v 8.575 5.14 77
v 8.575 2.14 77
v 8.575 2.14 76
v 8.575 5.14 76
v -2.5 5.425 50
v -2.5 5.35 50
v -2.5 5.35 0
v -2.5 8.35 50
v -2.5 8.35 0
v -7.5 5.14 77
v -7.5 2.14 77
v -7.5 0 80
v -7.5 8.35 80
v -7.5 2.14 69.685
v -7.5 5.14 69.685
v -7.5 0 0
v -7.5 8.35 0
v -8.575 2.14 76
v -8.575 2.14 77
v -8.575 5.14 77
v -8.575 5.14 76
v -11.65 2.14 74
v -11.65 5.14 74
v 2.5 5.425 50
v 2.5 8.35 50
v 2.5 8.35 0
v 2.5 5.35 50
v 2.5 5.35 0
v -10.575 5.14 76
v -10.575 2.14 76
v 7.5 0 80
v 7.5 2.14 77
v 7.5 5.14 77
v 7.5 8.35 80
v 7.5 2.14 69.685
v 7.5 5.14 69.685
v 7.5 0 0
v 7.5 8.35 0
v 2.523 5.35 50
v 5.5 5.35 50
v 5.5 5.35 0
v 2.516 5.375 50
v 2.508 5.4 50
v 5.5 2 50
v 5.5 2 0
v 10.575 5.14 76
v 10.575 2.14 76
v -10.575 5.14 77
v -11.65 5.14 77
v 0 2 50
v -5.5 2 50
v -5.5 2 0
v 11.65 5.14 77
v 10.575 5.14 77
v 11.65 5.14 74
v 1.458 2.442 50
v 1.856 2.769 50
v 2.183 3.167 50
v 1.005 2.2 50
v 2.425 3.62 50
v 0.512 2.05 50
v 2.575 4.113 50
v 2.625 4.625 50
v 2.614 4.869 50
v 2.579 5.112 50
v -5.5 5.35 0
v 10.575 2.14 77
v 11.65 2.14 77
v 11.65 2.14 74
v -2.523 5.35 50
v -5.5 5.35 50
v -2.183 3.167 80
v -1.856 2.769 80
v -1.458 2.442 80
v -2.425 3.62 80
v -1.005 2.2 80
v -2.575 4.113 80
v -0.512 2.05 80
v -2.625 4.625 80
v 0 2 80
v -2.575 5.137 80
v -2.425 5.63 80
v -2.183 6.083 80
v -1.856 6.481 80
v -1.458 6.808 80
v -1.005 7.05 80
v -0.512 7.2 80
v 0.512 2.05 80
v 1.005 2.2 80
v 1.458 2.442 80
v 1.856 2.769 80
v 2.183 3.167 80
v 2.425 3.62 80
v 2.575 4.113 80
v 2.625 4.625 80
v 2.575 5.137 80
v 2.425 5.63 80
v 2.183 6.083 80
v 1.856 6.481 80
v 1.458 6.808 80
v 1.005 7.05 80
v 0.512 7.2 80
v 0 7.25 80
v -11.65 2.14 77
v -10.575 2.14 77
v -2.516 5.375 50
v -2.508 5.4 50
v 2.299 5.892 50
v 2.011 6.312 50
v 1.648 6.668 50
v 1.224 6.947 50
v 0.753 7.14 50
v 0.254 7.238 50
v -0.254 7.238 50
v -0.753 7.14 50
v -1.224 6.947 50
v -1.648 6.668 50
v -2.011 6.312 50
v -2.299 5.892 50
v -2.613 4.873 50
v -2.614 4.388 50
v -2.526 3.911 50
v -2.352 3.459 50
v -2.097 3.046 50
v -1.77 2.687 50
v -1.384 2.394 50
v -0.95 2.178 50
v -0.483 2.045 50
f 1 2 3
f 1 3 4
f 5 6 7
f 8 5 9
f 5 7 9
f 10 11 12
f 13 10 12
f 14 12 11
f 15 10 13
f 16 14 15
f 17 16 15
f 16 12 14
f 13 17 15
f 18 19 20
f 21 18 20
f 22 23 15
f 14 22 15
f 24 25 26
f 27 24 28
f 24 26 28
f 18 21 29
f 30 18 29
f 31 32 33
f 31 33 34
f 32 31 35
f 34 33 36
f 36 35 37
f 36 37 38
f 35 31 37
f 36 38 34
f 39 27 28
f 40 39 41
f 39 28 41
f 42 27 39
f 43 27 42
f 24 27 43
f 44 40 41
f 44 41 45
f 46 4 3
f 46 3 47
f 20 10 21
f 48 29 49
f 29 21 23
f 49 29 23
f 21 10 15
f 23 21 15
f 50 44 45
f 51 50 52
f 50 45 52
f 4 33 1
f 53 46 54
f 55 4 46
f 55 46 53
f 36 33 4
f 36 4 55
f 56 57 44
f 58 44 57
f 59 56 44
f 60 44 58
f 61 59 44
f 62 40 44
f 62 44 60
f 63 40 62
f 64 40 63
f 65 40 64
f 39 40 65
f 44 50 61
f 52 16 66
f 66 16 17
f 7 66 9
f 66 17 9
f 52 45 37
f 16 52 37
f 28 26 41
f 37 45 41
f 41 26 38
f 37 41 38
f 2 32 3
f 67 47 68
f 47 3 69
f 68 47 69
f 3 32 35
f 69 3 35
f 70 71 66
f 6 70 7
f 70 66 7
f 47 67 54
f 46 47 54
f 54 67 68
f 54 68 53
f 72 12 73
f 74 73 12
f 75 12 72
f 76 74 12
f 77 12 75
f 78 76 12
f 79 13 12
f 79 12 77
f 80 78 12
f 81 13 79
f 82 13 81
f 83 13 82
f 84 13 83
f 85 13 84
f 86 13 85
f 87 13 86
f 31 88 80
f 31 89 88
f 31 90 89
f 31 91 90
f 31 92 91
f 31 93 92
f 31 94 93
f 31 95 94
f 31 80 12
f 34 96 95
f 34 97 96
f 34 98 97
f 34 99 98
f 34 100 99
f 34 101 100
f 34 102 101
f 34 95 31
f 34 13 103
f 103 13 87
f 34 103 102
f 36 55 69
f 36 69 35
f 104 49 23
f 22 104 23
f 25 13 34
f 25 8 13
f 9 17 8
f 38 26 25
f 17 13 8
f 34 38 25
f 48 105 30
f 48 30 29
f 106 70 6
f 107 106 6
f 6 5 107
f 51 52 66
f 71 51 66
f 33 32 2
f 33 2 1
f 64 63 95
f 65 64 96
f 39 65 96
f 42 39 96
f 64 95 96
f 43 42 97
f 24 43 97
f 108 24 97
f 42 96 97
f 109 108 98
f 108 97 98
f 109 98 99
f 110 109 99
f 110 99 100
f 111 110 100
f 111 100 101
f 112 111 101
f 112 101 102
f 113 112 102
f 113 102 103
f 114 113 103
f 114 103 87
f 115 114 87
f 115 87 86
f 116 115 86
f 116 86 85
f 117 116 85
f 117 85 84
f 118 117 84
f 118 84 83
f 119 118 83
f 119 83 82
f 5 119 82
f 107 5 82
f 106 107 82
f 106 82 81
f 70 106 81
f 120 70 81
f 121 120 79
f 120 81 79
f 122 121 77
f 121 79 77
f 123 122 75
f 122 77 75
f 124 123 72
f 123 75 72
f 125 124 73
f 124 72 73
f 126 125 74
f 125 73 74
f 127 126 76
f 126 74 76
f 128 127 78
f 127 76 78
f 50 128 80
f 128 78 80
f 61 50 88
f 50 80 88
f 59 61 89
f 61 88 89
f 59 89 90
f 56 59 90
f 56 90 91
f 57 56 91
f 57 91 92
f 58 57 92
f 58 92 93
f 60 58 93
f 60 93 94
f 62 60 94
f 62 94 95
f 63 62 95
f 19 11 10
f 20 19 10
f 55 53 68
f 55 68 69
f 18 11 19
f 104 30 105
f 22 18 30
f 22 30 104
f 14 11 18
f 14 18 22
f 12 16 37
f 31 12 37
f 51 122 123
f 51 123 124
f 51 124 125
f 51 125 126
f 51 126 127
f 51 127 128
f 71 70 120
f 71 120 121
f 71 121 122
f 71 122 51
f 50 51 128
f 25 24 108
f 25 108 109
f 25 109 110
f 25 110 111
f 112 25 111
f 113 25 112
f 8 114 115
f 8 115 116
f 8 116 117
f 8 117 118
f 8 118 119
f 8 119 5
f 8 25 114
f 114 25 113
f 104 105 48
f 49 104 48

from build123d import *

# Parameters (mm, degrees)
SKETCH9_W           = 15
SKETCH9_H           = 8.35
BOSS_EXTRUDE4_DEPTH = 80
CUT_EXTRUDE4_DEPTH  = 50
SKETCH10_R          = 2.625
CUT_EXTRUDE5_DEPTH  = 30
SKETCH12_W          = 3
SKETCH12_H          = 3
BOSS_EXTRUDE5_DEPTH = 4.15
SKETCH13_W          = 2
SKETCH13_H          = 3
CUT_EXTRUDE6_DEPTH  = 1
BOSS_EXTRUDE6_DEPTH = 3


with BuildPart() as part:
    # Sketch9 → Boss-Extrude4 (new body)
    with BuildSketch(Plane.XY):
        with Locations((0, 4.175)):
            Rectangle(SKETCH9_W, SKETCH9_H)
    extrude(amount=BOSS_EXTRUDE4_DEPTH)

    # Sketch7 → Cut-Extrude4 (cut)
    with BuildSketch(Plane.XY):
        Polygon((-5.5, 2), (-5.5, 5.35), (-2.5, 5.35), (-2.5, 8.35), (2.5, 8.35), (2.5, 5.35), (5.5, 5.35), (5.5, 2), align=None)
    extrude(amount=CUT_EXTRUDE4_DEPTH, mode=Mode.SUBTRACT)

    # Sketch10 → Cut-Extrude5 (cut)
    with BuildSketch(Plane.XY.offset(80)):
        with Locations((0, 4.625)):
            Circle(SKETCH10_R)
    extrude(amount=-CUT_EXTRUDE5_DEPTH, mode=Mode.SUBTRACT)

    # Sketch12 → Boss-Extrude5 (add)
    with BuildSketch(Plane(origin=(7.5, 0, 0), x_dir=(0, 0, -1), z_dir=(1, 0, 0))):
        with Locations((-75.5, 3.64)):
            Rectangle(SKETCH12_W, SKETCH12_H)
    boss_extrude5 = extrude(amount=BOSS_EXTRUDE5_DEPTH)

    # Sketch13 → Cut-Extrude6 (cut)
    with BuildSketch(Plane.XY.offset(77)):
        with Locations((9.575, 3.64)):
            Rectangle(SKETCH13_W, SKETCH13_H)
    cut_extrude6 = extrude(amount=-CUT_EXTRUDE6_DEPTH, mode=Mode.SUBTRACT)

    # Mirror2: Boss-Extrude5 across plane
    add(boss_extrude5.mirror(Plane(origin=(0, 0, 0), x_dir=(0, 0, 1), z_dir=(1, 0, 0))))

    # Mirror4: Cut-Extrude6 across plane
    add(cut_extrude6.mirror(Plane(origin=(0, 0, 0), x_dir=(0, 0, 1), z_dir=(1, 0, 0))), mode=Mode.SUBTRACT)

    # Sketch14 → Boss-Extrude6 (add)
    with BuildSketch(Plane(origin=(0, 5.14, 0), x_dir=(1, 0, 0), z_dir=(0, 1, 0))):
        Polygon((11.65, -74), (7.5, -69.685450349), (7.5, -74), align=None)
    boss_extrude6 = extrude(amount=-BOSS_EXTRUDE6_DEPTH)

    # Mirror5: Boss-Extrude6 across plane
    add(boss_extrude6.mirror(Plane(origin=(0, 0, 0), x_dir=(0, 0, 1), z_dir=(1, 0, 0))))


solid = part.part
